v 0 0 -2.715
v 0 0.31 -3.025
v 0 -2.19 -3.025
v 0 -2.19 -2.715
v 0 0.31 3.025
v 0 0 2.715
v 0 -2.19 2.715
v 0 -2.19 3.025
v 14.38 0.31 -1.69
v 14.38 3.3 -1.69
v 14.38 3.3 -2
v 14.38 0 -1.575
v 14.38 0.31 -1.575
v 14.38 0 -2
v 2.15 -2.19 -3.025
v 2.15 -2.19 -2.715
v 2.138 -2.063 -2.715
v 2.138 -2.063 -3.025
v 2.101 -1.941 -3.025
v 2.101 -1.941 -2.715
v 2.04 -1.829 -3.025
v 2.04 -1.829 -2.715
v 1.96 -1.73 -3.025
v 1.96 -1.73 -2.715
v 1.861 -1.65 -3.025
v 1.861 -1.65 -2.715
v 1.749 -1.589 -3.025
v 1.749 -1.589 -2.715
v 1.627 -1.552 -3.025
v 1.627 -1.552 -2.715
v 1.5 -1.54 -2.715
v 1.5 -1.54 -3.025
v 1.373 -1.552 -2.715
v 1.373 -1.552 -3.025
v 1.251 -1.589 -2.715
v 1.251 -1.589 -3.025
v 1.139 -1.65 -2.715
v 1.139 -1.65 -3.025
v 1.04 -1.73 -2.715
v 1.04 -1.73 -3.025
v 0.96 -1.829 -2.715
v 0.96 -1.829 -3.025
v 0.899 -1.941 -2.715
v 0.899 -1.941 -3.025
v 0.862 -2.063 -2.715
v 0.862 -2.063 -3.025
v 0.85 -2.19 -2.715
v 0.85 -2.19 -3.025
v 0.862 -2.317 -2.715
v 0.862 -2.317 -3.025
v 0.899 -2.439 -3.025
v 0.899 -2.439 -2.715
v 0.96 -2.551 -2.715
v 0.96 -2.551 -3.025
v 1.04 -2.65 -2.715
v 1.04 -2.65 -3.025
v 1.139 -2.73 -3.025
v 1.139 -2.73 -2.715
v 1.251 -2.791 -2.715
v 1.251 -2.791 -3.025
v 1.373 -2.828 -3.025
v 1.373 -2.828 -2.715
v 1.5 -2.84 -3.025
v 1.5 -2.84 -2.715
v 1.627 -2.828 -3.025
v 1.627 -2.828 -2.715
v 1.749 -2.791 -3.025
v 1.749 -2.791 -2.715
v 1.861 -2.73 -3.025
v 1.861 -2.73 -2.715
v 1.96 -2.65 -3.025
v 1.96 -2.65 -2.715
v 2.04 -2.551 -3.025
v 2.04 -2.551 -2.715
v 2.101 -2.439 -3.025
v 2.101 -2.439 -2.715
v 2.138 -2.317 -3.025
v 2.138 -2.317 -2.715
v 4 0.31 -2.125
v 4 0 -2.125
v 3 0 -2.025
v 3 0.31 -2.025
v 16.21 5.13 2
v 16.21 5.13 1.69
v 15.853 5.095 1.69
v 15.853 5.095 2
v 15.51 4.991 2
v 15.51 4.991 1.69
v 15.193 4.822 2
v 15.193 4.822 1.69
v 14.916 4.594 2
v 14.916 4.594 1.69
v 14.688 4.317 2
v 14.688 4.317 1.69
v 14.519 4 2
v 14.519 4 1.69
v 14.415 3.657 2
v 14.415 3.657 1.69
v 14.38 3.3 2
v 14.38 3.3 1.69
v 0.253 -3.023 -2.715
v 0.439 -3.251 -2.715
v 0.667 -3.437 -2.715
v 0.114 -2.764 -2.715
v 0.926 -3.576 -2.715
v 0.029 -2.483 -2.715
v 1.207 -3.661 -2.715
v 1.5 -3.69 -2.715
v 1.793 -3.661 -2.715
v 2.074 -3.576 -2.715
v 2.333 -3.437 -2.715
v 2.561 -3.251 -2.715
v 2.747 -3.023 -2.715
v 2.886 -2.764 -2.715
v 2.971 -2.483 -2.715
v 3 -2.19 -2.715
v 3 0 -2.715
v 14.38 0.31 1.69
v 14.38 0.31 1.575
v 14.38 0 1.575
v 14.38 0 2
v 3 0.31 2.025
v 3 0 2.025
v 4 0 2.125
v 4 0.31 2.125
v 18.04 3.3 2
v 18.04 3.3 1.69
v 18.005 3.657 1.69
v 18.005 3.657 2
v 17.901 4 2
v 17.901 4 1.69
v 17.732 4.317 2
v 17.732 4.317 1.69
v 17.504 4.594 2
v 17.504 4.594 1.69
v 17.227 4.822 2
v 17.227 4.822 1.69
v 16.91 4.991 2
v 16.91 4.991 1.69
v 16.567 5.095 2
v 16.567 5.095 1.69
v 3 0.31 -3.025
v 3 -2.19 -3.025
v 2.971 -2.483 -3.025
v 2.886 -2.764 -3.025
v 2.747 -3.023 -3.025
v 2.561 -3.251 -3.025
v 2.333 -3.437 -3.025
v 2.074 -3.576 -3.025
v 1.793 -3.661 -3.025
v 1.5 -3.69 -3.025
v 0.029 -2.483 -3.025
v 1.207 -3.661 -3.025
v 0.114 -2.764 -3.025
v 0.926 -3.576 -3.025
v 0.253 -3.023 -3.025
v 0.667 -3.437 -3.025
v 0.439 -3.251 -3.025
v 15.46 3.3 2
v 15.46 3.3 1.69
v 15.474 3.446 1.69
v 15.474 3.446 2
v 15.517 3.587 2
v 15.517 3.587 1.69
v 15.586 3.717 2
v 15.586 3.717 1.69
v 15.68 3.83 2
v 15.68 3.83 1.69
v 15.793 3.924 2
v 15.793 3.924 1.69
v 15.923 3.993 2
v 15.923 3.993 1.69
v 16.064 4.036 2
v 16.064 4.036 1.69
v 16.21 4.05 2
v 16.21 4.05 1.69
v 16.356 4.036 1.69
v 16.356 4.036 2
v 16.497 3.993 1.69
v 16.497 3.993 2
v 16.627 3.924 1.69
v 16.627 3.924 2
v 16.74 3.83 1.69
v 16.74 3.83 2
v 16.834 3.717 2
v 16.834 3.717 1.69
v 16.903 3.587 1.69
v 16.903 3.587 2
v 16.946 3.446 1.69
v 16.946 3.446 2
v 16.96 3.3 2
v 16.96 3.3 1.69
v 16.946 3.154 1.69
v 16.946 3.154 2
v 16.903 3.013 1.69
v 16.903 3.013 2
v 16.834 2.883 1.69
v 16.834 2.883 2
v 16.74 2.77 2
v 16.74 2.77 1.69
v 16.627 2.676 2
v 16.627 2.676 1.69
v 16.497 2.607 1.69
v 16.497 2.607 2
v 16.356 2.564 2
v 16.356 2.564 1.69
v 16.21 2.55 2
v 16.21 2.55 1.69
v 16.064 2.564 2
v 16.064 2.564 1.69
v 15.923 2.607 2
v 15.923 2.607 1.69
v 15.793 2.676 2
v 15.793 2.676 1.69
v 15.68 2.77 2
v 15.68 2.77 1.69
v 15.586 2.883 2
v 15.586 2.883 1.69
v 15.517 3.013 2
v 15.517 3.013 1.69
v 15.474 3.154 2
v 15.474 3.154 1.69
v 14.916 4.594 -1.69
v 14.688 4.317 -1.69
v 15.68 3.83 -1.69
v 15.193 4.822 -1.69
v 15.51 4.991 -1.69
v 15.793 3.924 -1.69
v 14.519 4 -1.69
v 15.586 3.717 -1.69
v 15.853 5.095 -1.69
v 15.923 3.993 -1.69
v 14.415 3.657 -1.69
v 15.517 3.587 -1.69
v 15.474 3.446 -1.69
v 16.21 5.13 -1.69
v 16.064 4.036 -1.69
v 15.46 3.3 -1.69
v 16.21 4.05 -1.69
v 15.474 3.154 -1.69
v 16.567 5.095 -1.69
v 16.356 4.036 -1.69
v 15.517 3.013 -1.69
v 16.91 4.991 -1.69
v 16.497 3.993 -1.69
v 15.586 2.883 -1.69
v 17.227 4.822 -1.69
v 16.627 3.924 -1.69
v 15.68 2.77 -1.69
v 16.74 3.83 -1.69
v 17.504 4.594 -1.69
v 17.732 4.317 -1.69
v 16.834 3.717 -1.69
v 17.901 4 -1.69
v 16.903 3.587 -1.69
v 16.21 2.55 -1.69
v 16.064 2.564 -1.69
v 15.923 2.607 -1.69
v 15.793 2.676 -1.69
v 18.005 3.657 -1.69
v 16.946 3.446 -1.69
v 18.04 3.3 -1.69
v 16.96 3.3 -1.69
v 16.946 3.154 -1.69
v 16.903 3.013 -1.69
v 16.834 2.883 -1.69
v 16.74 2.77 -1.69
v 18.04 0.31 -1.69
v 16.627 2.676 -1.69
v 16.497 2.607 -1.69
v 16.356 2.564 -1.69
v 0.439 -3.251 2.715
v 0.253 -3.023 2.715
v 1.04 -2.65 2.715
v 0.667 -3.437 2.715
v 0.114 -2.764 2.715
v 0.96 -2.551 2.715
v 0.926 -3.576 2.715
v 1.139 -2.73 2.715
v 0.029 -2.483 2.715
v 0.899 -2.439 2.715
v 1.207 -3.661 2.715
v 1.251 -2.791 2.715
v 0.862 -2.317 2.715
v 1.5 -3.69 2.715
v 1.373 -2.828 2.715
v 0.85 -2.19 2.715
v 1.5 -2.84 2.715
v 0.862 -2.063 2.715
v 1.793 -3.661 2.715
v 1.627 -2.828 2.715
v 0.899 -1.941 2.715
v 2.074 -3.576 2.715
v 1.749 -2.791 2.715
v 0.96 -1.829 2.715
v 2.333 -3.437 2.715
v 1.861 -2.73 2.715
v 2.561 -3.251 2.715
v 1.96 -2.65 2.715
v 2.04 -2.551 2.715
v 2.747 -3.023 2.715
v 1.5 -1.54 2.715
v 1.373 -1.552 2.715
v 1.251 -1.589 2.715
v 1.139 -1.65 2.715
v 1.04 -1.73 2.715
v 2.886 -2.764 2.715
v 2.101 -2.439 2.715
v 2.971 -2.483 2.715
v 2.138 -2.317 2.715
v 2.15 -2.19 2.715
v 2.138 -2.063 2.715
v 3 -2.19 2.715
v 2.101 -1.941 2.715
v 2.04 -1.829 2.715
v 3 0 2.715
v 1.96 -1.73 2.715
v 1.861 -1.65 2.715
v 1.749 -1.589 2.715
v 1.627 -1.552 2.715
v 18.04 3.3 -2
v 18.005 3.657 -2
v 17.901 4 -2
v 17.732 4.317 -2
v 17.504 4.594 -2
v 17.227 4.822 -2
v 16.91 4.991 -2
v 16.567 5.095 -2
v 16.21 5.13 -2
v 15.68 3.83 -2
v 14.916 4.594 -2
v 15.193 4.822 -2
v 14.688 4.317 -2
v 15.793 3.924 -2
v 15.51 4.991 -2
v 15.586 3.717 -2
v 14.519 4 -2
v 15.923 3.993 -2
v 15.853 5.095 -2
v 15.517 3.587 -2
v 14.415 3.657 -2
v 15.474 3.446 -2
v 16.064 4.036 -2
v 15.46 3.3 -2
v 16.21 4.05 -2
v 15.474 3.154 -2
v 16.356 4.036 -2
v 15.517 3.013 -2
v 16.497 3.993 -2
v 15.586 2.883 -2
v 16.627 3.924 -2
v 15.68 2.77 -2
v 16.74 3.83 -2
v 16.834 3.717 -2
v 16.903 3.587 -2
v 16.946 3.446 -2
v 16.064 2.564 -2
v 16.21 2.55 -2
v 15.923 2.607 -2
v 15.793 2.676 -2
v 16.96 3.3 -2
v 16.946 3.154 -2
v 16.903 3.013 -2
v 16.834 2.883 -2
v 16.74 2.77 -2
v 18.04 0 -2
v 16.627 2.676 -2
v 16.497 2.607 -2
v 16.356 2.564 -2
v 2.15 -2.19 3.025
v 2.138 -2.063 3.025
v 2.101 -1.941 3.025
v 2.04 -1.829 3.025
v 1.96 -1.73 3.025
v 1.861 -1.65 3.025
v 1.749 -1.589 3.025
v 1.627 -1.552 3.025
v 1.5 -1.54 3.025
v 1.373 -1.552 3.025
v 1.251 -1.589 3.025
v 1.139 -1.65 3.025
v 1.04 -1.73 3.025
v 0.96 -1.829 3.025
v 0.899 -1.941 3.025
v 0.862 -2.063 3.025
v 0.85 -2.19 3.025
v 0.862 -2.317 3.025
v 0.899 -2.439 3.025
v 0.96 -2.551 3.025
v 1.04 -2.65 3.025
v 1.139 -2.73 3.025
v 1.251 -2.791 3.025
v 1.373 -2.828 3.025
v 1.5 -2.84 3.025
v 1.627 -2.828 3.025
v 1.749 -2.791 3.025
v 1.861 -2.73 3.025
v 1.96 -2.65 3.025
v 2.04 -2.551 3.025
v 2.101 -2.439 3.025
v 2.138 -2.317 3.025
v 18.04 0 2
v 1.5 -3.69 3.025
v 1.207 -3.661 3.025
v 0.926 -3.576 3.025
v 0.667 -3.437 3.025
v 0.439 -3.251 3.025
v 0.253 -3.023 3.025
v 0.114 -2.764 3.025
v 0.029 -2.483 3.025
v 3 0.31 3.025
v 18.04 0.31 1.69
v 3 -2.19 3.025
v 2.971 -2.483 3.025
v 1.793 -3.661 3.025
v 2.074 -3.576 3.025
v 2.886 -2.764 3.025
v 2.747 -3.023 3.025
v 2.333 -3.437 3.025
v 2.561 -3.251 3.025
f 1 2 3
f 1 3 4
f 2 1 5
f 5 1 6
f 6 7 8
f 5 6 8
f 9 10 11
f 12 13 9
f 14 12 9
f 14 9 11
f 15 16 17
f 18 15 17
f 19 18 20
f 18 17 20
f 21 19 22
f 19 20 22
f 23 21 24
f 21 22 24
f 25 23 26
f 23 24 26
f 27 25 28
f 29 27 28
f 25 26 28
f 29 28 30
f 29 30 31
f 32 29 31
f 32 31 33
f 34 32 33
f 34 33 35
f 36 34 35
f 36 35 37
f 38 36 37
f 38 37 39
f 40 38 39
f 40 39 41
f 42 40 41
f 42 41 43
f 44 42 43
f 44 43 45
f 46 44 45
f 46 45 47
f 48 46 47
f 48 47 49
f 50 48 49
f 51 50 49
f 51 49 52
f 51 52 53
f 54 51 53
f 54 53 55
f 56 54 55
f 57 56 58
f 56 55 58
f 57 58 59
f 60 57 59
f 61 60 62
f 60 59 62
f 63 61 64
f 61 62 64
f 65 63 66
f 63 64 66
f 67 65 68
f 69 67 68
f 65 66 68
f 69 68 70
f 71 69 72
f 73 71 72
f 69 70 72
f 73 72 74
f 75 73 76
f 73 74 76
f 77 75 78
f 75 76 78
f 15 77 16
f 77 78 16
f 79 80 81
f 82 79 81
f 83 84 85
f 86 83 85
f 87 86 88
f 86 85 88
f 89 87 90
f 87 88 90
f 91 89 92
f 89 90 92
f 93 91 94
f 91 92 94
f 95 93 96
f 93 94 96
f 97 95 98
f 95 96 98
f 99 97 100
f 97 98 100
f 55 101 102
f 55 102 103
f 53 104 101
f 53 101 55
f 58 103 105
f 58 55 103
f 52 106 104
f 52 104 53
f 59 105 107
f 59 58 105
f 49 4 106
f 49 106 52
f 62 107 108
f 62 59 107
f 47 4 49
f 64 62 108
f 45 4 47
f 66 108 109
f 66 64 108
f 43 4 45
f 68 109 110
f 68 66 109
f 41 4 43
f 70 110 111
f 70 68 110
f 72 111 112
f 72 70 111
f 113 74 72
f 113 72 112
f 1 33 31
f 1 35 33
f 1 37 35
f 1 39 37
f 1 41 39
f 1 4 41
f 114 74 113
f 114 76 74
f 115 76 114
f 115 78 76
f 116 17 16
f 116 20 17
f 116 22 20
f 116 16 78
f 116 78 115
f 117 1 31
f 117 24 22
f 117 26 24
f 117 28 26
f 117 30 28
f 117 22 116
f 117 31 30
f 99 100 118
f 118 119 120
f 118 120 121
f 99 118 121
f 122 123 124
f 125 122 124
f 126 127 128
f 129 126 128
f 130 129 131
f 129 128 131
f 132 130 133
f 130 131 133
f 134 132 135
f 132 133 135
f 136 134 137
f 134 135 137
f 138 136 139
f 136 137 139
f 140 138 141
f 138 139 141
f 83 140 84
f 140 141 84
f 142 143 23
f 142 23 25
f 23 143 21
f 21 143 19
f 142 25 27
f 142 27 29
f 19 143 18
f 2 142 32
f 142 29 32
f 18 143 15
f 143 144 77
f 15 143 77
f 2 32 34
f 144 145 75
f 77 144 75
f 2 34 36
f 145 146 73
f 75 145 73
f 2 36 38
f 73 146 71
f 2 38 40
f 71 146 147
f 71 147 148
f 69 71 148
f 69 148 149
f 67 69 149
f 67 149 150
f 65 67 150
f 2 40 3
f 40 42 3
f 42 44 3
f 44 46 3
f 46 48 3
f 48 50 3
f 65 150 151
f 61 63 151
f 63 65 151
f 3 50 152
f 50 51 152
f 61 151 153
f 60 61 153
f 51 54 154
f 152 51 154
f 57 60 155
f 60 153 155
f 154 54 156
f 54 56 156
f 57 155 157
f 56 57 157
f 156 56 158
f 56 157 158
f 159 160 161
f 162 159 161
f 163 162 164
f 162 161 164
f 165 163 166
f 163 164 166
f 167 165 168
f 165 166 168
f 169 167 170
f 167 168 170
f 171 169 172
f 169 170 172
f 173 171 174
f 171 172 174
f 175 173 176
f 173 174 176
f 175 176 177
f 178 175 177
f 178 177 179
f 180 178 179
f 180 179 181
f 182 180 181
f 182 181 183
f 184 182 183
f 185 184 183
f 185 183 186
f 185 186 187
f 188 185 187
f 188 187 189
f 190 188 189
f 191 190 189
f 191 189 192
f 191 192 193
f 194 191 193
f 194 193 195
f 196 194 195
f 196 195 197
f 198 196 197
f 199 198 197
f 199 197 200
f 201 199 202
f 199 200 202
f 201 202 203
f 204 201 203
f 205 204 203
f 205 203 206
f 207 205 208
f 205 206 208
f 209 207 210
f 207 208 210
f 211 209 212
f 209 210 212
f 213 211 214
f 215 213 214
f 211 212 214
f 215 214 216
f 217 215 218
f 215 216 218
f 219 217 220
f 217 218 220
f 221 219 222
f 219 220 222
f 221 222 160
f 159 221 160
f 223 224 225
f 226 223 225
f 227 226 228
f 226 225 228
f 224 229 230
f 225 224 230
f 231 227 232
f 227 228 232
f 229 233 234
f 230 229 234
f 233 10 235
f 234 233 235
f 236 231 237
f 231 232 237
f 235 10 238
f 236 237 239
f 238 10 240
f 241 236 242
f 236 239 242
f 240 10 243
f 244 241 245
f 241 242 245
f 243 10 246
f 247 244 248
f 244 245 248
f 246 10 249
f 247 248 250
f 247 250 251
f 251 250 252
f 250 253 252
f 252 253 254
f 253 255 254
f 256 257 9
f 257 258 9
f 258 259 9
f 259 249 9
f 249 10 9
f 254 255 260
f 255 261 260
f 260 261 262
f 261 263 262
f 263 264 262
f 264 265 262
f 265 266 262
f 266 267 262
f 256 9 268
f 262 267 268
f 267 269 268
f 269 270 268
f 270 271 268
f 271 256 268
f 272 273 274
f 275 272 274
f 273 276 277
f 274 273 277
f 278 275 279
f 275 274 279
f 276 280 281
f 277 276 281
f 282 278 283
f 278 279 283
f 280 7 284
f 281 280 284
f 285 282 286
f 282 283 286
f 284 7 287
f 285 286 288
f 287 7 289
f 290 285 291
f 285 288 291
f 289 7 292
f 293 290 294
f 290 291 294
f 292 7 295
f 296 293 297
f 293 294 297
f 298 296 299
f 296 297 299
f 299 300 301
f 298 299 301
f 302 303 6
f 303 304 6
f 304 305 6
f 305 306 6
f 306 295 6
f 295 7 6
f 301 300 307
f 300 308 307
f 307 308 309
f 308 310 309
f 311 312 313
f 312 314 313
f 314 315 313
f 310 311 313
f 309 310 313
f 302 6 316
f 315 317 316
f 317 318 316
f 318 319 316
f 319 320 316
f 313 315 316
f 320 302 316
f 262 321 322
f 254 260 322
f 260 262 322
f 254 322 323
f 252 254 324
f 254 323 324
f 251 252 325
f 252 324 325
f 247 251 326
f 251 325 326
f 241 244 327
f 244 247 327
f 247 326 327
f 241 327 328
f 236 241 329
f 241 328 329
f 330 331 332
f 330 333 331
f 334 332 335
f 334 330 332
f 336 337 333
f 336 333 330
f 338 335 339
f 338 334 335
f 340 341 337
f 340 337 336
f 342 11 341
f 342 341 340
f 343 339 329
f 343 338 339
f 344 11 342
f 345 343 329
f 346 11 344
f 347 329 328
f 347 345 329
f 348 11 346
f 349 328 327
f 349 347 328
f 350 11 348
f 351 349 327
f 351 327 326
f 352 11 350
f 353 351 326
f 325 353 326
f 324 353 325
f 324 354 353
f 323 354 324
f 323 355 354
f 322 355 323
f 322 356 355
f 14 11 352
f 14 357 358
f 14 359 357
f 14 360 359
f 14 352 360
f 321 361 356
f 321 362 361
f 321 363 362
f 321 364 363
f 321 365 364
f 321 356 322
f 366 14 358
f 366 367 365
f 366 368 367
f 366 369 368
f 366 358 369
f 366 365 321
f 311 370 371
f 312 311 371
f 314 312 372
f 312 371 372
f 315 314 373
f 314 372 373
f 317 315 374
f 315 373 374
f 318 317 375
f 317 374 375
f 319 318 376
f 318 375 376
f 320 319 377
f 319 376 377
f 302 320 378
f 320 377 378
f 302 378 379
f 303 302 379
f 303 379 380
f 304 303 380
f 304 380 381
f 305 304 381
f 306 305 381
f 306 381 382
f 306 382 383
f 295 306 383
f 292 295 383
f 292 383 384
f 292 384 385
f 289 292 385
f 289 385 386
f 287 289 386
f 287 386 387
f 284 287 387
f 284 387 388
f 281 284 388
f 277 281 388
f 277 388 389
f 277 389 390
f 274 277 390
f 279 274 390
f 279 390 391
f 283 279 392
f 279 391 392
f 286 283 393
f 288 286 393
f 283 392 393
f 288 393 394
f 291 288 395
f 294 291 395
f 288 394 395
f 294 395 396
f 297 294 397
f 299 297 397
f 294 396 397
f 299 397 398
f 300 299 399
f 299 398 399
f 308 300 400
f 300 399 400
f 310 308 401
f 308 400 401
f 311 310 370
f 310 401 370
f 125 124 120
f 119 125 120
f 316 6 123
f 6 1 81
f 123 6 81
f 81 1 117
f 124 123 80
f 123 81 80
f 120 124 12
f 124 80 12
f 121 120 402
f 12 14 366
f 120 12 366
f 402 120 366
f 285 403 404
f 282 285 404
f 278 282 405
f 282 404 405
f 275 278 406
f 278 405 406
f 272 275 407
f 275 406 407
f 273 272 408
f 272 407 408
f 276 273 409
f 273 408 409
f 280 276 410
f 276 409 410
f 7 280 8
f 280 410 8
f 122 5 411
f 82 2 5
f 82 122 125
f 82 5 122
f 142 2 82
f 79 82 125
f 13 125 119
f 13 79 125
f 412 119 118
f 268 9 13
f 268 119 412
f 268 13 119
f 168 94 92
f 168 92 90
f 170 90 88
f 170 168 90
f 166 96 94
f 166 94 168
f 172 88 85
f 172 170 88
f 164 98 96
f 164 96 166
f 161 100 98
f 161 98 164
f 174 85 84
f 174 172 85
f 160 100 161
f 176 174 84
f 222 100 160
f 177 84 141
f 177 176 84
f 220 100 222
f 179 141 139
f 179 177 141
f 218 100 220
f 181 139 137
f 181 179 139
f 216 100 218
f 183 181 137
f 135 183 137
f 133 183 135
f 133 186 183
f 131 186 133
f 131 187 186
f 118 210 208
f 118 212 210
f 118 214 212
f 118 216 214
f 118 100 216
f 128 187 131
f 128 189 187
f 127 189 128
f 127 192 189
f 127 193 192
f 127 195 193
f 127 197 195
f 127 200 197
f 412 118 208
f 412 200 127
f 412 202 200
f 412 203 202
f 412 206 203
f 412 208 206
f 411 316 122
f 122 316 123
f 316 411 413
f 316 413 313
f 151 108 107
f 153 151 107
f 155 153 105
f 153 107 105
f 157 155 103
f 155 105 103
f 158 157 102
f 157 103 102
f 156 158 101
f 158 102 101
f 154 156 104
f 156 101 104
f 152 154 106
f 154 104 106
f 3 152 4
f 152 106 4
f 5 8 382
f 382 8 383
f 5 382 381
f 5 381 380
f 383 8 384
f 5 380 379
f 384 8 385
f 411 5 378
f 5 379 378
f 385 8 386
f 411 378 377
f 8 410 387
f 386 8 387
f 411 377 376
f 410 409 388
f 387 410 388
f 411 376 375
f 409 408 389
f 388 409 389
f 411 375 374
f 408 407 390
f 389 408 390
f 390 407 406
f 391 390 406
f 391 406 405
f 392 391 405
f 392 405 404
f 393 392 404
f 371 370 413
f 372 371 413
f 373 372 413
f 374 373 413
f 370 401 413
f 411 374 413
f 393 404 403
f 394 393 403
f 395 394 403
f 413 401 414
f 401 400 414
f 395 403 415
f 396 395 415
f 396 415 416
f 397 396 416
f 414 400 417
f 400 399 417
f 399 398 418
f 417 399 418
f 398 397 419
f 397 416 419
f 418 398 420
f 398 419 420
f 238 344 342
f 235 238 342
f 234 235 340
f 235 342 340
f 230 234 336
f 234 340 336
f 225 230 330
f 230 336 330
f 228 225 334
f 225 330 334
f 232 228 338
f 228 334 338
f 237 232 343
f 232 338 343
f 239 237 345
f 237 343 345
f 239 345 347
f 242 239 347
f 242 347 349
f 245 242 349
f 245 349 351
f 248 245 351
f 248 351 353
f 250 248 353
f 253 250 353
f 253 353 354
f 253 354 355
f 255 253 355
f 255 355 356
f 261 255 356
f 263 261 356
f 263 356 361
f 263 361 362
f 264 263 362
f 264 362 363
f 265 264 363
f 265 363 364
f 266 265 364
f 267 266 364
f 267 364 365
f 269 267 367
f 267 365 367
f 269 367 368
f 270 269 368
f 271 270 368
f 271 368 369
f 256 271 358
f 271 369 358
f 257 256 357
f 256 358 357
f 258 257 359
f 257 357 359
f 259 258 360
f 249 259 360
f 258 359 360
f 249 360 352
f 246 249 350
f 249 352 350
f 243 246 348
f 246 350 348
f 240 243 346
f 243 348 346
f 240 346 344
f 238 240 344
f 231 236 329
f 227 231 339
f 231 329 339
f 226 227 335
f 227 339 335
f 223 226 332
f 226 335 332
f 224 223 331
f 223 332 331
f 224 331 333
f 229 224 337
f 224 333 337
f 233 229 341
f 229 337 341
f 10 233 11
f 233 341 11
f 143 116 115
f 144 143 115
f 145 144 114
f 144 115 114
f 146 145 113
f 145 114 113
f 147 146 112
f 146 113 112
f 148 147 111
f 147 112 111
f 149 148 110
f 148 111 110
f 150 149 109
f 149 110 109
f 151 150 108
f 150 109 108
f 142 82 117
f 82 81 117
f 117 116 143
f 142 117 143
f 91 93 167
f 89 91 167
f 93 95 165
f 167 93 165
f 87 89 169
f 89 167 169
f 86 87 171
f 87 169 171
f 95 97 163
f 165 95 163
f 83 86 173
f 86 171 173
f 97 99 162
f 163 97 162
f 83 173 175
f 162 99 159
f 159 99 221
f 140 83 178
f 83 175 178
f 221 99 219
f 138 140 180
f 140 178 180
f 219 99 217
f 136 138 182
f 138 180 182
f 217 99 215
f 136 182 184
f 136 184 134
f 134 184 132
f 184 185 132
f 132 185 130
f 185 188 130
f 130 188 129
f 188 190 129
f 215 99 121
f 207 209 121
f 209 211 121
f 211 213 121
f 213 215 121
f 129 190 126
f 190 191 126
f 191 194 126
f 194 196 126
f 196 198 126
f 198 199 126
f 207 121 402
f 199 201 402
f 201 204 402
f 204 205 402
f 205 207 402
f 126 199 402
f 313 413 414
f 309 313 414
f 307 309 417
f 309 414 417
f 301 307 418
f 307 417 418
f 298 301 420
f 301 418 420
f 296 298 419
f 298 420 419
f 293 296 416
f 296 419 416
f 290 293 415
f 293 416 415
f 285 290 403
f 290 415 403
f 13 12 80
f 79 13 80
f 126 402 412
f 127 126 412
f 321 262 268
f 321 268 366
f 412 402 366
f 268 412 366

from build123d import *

# Parameters (mm, degrees)
BOSS_EXTRUDE1_DEPTH = 0.31
SKETCH2_W           = 3
SKETCH2_H           = 0.31
BOSS_EXTRUDE2_DEPTH = 4
SKETCH3_R           = 0.65
CUT_EXTRUDE1_DEPTH  = 11
SKETCH4_W           = 3.66
SKETCH4_H           = 0.31
BOSS_EXTRUDE3_DEPTH = 4.82
SKETCH5_R           = 0.75
CUT_EXTRUDE2_DEPTH  = 4.82


with BuildPart() as part:
    # Sketch1 → Boss-Extrude1 (new body)
    with BuildSketch(Plane(origin=(0, 0, 0), x_dir=(1, 0, 0), z_dir=(0, 1, 0))):
        Polygon((0, 3.025), (0, -3.025), (3, -3.025), (3, -2.025), (4, -2.125), (14.38, -1.575), (14.38, -2), (18.04, -2), (18.04, 2), (14.38, 2), (14.38, 1.575), (4, 2.125), (3, 2.025), (3, 3.025), align=None)
    extrude(amount=BOSS_EXTRUDE1_DEPTH)

    # Sketch2 → Boss-Extrude2 (add)
    with BuildSketch(Plane(origin=(0, 0.31, 0), x_dir=(1, 0, 0), z_dir=(0, 1, 0))):
        with Locations((1.5, 2.87)):
            Rectangle(SKETCH2_W, SKETCH2_H)
        with Locations((1.5, -2.87)):
            Rectangle(SKETCH2_W, SKETCH2_H)
    extrude(amount=-BOSS_EXTRUDE2_DEPTH)

    # Sketch3 → Cut-Extrude1 (cut)
    with BuildSketch(Plane.XY.offset(3.025)):
        with Locations((1.5, -2.19)):
            Circle(SKETCH3_R)
        with BuildLine():
            ThreePointArc((3, -2.19), (2.560660172, -3.250660172), (1.5, -3.69))
            Line((1.5, -3.69), (3, -3.69))
            Line((3, -3.69), (3, -2.19))
        make_face()
        with BuildLine():
            ThreePointArc((1.5, -3.69), (0.439339828, -3.250660172), (0, -2.19))
            Line((0, -2.19), (0, -3.69))
            Line((0, -3.69), (1.5, -3.69))
        make_face()
    extrude(amount=-CUT_EXTRUDE1_DEPTH, mode=Mode.SUBTRACT)

    # Sketch4 → Boss-Extrude3 (add)
    with BuildSketch(Plane(origin=(0, 0.31, 0), x_dir=(1, 0, 0), z_dir=(0, 1, 0))):
        with Locations((16.21, 1.845)):
            Rectangle(SKETCH4_W, SKETCH4_H)
        with Locations((16.21, -1.845)):
            Rectangle(SKETCH4_W, SKETCH4_H)
    extrude(amount=BOSS_EXTRUDE3_DEPTH)

    # Sketch5 → Cut-Extrude2 (cut)
    with BuildSketch(Plane(origin=(0, 0, -2), x_dir=(-1, 0, 0), z_dir=(0, 0, -1))):
        with BuildLine():
            Line((-18.04, 5.13), (-18.04, 3.3))
            ThreePointArc((-18.04, 3.3), (-17.50400541, 4.59400541), (-16.21, 5.13))
            Line((-16.21, 5.13), (-18.04, 5.13))
        make_face()
        with BuildLine():
            Line((-14.38, 5.13), (-16.21, 5.13))
            ThreePointArc((-16.21, 5.13), (-14.91599459, 4.59400541), (-14.38, 3.3))
            Line((-14.38, 3.3), (-14.38, 5.13))
        make_face()
        with Locations((-16.21, 3.3)):
            Circle(SKETCH5_R)
    extrude(amount=-CUT_EXTRUDE2_DEPTH, mode=Mode.SUBTRACT)


solid = part.part
